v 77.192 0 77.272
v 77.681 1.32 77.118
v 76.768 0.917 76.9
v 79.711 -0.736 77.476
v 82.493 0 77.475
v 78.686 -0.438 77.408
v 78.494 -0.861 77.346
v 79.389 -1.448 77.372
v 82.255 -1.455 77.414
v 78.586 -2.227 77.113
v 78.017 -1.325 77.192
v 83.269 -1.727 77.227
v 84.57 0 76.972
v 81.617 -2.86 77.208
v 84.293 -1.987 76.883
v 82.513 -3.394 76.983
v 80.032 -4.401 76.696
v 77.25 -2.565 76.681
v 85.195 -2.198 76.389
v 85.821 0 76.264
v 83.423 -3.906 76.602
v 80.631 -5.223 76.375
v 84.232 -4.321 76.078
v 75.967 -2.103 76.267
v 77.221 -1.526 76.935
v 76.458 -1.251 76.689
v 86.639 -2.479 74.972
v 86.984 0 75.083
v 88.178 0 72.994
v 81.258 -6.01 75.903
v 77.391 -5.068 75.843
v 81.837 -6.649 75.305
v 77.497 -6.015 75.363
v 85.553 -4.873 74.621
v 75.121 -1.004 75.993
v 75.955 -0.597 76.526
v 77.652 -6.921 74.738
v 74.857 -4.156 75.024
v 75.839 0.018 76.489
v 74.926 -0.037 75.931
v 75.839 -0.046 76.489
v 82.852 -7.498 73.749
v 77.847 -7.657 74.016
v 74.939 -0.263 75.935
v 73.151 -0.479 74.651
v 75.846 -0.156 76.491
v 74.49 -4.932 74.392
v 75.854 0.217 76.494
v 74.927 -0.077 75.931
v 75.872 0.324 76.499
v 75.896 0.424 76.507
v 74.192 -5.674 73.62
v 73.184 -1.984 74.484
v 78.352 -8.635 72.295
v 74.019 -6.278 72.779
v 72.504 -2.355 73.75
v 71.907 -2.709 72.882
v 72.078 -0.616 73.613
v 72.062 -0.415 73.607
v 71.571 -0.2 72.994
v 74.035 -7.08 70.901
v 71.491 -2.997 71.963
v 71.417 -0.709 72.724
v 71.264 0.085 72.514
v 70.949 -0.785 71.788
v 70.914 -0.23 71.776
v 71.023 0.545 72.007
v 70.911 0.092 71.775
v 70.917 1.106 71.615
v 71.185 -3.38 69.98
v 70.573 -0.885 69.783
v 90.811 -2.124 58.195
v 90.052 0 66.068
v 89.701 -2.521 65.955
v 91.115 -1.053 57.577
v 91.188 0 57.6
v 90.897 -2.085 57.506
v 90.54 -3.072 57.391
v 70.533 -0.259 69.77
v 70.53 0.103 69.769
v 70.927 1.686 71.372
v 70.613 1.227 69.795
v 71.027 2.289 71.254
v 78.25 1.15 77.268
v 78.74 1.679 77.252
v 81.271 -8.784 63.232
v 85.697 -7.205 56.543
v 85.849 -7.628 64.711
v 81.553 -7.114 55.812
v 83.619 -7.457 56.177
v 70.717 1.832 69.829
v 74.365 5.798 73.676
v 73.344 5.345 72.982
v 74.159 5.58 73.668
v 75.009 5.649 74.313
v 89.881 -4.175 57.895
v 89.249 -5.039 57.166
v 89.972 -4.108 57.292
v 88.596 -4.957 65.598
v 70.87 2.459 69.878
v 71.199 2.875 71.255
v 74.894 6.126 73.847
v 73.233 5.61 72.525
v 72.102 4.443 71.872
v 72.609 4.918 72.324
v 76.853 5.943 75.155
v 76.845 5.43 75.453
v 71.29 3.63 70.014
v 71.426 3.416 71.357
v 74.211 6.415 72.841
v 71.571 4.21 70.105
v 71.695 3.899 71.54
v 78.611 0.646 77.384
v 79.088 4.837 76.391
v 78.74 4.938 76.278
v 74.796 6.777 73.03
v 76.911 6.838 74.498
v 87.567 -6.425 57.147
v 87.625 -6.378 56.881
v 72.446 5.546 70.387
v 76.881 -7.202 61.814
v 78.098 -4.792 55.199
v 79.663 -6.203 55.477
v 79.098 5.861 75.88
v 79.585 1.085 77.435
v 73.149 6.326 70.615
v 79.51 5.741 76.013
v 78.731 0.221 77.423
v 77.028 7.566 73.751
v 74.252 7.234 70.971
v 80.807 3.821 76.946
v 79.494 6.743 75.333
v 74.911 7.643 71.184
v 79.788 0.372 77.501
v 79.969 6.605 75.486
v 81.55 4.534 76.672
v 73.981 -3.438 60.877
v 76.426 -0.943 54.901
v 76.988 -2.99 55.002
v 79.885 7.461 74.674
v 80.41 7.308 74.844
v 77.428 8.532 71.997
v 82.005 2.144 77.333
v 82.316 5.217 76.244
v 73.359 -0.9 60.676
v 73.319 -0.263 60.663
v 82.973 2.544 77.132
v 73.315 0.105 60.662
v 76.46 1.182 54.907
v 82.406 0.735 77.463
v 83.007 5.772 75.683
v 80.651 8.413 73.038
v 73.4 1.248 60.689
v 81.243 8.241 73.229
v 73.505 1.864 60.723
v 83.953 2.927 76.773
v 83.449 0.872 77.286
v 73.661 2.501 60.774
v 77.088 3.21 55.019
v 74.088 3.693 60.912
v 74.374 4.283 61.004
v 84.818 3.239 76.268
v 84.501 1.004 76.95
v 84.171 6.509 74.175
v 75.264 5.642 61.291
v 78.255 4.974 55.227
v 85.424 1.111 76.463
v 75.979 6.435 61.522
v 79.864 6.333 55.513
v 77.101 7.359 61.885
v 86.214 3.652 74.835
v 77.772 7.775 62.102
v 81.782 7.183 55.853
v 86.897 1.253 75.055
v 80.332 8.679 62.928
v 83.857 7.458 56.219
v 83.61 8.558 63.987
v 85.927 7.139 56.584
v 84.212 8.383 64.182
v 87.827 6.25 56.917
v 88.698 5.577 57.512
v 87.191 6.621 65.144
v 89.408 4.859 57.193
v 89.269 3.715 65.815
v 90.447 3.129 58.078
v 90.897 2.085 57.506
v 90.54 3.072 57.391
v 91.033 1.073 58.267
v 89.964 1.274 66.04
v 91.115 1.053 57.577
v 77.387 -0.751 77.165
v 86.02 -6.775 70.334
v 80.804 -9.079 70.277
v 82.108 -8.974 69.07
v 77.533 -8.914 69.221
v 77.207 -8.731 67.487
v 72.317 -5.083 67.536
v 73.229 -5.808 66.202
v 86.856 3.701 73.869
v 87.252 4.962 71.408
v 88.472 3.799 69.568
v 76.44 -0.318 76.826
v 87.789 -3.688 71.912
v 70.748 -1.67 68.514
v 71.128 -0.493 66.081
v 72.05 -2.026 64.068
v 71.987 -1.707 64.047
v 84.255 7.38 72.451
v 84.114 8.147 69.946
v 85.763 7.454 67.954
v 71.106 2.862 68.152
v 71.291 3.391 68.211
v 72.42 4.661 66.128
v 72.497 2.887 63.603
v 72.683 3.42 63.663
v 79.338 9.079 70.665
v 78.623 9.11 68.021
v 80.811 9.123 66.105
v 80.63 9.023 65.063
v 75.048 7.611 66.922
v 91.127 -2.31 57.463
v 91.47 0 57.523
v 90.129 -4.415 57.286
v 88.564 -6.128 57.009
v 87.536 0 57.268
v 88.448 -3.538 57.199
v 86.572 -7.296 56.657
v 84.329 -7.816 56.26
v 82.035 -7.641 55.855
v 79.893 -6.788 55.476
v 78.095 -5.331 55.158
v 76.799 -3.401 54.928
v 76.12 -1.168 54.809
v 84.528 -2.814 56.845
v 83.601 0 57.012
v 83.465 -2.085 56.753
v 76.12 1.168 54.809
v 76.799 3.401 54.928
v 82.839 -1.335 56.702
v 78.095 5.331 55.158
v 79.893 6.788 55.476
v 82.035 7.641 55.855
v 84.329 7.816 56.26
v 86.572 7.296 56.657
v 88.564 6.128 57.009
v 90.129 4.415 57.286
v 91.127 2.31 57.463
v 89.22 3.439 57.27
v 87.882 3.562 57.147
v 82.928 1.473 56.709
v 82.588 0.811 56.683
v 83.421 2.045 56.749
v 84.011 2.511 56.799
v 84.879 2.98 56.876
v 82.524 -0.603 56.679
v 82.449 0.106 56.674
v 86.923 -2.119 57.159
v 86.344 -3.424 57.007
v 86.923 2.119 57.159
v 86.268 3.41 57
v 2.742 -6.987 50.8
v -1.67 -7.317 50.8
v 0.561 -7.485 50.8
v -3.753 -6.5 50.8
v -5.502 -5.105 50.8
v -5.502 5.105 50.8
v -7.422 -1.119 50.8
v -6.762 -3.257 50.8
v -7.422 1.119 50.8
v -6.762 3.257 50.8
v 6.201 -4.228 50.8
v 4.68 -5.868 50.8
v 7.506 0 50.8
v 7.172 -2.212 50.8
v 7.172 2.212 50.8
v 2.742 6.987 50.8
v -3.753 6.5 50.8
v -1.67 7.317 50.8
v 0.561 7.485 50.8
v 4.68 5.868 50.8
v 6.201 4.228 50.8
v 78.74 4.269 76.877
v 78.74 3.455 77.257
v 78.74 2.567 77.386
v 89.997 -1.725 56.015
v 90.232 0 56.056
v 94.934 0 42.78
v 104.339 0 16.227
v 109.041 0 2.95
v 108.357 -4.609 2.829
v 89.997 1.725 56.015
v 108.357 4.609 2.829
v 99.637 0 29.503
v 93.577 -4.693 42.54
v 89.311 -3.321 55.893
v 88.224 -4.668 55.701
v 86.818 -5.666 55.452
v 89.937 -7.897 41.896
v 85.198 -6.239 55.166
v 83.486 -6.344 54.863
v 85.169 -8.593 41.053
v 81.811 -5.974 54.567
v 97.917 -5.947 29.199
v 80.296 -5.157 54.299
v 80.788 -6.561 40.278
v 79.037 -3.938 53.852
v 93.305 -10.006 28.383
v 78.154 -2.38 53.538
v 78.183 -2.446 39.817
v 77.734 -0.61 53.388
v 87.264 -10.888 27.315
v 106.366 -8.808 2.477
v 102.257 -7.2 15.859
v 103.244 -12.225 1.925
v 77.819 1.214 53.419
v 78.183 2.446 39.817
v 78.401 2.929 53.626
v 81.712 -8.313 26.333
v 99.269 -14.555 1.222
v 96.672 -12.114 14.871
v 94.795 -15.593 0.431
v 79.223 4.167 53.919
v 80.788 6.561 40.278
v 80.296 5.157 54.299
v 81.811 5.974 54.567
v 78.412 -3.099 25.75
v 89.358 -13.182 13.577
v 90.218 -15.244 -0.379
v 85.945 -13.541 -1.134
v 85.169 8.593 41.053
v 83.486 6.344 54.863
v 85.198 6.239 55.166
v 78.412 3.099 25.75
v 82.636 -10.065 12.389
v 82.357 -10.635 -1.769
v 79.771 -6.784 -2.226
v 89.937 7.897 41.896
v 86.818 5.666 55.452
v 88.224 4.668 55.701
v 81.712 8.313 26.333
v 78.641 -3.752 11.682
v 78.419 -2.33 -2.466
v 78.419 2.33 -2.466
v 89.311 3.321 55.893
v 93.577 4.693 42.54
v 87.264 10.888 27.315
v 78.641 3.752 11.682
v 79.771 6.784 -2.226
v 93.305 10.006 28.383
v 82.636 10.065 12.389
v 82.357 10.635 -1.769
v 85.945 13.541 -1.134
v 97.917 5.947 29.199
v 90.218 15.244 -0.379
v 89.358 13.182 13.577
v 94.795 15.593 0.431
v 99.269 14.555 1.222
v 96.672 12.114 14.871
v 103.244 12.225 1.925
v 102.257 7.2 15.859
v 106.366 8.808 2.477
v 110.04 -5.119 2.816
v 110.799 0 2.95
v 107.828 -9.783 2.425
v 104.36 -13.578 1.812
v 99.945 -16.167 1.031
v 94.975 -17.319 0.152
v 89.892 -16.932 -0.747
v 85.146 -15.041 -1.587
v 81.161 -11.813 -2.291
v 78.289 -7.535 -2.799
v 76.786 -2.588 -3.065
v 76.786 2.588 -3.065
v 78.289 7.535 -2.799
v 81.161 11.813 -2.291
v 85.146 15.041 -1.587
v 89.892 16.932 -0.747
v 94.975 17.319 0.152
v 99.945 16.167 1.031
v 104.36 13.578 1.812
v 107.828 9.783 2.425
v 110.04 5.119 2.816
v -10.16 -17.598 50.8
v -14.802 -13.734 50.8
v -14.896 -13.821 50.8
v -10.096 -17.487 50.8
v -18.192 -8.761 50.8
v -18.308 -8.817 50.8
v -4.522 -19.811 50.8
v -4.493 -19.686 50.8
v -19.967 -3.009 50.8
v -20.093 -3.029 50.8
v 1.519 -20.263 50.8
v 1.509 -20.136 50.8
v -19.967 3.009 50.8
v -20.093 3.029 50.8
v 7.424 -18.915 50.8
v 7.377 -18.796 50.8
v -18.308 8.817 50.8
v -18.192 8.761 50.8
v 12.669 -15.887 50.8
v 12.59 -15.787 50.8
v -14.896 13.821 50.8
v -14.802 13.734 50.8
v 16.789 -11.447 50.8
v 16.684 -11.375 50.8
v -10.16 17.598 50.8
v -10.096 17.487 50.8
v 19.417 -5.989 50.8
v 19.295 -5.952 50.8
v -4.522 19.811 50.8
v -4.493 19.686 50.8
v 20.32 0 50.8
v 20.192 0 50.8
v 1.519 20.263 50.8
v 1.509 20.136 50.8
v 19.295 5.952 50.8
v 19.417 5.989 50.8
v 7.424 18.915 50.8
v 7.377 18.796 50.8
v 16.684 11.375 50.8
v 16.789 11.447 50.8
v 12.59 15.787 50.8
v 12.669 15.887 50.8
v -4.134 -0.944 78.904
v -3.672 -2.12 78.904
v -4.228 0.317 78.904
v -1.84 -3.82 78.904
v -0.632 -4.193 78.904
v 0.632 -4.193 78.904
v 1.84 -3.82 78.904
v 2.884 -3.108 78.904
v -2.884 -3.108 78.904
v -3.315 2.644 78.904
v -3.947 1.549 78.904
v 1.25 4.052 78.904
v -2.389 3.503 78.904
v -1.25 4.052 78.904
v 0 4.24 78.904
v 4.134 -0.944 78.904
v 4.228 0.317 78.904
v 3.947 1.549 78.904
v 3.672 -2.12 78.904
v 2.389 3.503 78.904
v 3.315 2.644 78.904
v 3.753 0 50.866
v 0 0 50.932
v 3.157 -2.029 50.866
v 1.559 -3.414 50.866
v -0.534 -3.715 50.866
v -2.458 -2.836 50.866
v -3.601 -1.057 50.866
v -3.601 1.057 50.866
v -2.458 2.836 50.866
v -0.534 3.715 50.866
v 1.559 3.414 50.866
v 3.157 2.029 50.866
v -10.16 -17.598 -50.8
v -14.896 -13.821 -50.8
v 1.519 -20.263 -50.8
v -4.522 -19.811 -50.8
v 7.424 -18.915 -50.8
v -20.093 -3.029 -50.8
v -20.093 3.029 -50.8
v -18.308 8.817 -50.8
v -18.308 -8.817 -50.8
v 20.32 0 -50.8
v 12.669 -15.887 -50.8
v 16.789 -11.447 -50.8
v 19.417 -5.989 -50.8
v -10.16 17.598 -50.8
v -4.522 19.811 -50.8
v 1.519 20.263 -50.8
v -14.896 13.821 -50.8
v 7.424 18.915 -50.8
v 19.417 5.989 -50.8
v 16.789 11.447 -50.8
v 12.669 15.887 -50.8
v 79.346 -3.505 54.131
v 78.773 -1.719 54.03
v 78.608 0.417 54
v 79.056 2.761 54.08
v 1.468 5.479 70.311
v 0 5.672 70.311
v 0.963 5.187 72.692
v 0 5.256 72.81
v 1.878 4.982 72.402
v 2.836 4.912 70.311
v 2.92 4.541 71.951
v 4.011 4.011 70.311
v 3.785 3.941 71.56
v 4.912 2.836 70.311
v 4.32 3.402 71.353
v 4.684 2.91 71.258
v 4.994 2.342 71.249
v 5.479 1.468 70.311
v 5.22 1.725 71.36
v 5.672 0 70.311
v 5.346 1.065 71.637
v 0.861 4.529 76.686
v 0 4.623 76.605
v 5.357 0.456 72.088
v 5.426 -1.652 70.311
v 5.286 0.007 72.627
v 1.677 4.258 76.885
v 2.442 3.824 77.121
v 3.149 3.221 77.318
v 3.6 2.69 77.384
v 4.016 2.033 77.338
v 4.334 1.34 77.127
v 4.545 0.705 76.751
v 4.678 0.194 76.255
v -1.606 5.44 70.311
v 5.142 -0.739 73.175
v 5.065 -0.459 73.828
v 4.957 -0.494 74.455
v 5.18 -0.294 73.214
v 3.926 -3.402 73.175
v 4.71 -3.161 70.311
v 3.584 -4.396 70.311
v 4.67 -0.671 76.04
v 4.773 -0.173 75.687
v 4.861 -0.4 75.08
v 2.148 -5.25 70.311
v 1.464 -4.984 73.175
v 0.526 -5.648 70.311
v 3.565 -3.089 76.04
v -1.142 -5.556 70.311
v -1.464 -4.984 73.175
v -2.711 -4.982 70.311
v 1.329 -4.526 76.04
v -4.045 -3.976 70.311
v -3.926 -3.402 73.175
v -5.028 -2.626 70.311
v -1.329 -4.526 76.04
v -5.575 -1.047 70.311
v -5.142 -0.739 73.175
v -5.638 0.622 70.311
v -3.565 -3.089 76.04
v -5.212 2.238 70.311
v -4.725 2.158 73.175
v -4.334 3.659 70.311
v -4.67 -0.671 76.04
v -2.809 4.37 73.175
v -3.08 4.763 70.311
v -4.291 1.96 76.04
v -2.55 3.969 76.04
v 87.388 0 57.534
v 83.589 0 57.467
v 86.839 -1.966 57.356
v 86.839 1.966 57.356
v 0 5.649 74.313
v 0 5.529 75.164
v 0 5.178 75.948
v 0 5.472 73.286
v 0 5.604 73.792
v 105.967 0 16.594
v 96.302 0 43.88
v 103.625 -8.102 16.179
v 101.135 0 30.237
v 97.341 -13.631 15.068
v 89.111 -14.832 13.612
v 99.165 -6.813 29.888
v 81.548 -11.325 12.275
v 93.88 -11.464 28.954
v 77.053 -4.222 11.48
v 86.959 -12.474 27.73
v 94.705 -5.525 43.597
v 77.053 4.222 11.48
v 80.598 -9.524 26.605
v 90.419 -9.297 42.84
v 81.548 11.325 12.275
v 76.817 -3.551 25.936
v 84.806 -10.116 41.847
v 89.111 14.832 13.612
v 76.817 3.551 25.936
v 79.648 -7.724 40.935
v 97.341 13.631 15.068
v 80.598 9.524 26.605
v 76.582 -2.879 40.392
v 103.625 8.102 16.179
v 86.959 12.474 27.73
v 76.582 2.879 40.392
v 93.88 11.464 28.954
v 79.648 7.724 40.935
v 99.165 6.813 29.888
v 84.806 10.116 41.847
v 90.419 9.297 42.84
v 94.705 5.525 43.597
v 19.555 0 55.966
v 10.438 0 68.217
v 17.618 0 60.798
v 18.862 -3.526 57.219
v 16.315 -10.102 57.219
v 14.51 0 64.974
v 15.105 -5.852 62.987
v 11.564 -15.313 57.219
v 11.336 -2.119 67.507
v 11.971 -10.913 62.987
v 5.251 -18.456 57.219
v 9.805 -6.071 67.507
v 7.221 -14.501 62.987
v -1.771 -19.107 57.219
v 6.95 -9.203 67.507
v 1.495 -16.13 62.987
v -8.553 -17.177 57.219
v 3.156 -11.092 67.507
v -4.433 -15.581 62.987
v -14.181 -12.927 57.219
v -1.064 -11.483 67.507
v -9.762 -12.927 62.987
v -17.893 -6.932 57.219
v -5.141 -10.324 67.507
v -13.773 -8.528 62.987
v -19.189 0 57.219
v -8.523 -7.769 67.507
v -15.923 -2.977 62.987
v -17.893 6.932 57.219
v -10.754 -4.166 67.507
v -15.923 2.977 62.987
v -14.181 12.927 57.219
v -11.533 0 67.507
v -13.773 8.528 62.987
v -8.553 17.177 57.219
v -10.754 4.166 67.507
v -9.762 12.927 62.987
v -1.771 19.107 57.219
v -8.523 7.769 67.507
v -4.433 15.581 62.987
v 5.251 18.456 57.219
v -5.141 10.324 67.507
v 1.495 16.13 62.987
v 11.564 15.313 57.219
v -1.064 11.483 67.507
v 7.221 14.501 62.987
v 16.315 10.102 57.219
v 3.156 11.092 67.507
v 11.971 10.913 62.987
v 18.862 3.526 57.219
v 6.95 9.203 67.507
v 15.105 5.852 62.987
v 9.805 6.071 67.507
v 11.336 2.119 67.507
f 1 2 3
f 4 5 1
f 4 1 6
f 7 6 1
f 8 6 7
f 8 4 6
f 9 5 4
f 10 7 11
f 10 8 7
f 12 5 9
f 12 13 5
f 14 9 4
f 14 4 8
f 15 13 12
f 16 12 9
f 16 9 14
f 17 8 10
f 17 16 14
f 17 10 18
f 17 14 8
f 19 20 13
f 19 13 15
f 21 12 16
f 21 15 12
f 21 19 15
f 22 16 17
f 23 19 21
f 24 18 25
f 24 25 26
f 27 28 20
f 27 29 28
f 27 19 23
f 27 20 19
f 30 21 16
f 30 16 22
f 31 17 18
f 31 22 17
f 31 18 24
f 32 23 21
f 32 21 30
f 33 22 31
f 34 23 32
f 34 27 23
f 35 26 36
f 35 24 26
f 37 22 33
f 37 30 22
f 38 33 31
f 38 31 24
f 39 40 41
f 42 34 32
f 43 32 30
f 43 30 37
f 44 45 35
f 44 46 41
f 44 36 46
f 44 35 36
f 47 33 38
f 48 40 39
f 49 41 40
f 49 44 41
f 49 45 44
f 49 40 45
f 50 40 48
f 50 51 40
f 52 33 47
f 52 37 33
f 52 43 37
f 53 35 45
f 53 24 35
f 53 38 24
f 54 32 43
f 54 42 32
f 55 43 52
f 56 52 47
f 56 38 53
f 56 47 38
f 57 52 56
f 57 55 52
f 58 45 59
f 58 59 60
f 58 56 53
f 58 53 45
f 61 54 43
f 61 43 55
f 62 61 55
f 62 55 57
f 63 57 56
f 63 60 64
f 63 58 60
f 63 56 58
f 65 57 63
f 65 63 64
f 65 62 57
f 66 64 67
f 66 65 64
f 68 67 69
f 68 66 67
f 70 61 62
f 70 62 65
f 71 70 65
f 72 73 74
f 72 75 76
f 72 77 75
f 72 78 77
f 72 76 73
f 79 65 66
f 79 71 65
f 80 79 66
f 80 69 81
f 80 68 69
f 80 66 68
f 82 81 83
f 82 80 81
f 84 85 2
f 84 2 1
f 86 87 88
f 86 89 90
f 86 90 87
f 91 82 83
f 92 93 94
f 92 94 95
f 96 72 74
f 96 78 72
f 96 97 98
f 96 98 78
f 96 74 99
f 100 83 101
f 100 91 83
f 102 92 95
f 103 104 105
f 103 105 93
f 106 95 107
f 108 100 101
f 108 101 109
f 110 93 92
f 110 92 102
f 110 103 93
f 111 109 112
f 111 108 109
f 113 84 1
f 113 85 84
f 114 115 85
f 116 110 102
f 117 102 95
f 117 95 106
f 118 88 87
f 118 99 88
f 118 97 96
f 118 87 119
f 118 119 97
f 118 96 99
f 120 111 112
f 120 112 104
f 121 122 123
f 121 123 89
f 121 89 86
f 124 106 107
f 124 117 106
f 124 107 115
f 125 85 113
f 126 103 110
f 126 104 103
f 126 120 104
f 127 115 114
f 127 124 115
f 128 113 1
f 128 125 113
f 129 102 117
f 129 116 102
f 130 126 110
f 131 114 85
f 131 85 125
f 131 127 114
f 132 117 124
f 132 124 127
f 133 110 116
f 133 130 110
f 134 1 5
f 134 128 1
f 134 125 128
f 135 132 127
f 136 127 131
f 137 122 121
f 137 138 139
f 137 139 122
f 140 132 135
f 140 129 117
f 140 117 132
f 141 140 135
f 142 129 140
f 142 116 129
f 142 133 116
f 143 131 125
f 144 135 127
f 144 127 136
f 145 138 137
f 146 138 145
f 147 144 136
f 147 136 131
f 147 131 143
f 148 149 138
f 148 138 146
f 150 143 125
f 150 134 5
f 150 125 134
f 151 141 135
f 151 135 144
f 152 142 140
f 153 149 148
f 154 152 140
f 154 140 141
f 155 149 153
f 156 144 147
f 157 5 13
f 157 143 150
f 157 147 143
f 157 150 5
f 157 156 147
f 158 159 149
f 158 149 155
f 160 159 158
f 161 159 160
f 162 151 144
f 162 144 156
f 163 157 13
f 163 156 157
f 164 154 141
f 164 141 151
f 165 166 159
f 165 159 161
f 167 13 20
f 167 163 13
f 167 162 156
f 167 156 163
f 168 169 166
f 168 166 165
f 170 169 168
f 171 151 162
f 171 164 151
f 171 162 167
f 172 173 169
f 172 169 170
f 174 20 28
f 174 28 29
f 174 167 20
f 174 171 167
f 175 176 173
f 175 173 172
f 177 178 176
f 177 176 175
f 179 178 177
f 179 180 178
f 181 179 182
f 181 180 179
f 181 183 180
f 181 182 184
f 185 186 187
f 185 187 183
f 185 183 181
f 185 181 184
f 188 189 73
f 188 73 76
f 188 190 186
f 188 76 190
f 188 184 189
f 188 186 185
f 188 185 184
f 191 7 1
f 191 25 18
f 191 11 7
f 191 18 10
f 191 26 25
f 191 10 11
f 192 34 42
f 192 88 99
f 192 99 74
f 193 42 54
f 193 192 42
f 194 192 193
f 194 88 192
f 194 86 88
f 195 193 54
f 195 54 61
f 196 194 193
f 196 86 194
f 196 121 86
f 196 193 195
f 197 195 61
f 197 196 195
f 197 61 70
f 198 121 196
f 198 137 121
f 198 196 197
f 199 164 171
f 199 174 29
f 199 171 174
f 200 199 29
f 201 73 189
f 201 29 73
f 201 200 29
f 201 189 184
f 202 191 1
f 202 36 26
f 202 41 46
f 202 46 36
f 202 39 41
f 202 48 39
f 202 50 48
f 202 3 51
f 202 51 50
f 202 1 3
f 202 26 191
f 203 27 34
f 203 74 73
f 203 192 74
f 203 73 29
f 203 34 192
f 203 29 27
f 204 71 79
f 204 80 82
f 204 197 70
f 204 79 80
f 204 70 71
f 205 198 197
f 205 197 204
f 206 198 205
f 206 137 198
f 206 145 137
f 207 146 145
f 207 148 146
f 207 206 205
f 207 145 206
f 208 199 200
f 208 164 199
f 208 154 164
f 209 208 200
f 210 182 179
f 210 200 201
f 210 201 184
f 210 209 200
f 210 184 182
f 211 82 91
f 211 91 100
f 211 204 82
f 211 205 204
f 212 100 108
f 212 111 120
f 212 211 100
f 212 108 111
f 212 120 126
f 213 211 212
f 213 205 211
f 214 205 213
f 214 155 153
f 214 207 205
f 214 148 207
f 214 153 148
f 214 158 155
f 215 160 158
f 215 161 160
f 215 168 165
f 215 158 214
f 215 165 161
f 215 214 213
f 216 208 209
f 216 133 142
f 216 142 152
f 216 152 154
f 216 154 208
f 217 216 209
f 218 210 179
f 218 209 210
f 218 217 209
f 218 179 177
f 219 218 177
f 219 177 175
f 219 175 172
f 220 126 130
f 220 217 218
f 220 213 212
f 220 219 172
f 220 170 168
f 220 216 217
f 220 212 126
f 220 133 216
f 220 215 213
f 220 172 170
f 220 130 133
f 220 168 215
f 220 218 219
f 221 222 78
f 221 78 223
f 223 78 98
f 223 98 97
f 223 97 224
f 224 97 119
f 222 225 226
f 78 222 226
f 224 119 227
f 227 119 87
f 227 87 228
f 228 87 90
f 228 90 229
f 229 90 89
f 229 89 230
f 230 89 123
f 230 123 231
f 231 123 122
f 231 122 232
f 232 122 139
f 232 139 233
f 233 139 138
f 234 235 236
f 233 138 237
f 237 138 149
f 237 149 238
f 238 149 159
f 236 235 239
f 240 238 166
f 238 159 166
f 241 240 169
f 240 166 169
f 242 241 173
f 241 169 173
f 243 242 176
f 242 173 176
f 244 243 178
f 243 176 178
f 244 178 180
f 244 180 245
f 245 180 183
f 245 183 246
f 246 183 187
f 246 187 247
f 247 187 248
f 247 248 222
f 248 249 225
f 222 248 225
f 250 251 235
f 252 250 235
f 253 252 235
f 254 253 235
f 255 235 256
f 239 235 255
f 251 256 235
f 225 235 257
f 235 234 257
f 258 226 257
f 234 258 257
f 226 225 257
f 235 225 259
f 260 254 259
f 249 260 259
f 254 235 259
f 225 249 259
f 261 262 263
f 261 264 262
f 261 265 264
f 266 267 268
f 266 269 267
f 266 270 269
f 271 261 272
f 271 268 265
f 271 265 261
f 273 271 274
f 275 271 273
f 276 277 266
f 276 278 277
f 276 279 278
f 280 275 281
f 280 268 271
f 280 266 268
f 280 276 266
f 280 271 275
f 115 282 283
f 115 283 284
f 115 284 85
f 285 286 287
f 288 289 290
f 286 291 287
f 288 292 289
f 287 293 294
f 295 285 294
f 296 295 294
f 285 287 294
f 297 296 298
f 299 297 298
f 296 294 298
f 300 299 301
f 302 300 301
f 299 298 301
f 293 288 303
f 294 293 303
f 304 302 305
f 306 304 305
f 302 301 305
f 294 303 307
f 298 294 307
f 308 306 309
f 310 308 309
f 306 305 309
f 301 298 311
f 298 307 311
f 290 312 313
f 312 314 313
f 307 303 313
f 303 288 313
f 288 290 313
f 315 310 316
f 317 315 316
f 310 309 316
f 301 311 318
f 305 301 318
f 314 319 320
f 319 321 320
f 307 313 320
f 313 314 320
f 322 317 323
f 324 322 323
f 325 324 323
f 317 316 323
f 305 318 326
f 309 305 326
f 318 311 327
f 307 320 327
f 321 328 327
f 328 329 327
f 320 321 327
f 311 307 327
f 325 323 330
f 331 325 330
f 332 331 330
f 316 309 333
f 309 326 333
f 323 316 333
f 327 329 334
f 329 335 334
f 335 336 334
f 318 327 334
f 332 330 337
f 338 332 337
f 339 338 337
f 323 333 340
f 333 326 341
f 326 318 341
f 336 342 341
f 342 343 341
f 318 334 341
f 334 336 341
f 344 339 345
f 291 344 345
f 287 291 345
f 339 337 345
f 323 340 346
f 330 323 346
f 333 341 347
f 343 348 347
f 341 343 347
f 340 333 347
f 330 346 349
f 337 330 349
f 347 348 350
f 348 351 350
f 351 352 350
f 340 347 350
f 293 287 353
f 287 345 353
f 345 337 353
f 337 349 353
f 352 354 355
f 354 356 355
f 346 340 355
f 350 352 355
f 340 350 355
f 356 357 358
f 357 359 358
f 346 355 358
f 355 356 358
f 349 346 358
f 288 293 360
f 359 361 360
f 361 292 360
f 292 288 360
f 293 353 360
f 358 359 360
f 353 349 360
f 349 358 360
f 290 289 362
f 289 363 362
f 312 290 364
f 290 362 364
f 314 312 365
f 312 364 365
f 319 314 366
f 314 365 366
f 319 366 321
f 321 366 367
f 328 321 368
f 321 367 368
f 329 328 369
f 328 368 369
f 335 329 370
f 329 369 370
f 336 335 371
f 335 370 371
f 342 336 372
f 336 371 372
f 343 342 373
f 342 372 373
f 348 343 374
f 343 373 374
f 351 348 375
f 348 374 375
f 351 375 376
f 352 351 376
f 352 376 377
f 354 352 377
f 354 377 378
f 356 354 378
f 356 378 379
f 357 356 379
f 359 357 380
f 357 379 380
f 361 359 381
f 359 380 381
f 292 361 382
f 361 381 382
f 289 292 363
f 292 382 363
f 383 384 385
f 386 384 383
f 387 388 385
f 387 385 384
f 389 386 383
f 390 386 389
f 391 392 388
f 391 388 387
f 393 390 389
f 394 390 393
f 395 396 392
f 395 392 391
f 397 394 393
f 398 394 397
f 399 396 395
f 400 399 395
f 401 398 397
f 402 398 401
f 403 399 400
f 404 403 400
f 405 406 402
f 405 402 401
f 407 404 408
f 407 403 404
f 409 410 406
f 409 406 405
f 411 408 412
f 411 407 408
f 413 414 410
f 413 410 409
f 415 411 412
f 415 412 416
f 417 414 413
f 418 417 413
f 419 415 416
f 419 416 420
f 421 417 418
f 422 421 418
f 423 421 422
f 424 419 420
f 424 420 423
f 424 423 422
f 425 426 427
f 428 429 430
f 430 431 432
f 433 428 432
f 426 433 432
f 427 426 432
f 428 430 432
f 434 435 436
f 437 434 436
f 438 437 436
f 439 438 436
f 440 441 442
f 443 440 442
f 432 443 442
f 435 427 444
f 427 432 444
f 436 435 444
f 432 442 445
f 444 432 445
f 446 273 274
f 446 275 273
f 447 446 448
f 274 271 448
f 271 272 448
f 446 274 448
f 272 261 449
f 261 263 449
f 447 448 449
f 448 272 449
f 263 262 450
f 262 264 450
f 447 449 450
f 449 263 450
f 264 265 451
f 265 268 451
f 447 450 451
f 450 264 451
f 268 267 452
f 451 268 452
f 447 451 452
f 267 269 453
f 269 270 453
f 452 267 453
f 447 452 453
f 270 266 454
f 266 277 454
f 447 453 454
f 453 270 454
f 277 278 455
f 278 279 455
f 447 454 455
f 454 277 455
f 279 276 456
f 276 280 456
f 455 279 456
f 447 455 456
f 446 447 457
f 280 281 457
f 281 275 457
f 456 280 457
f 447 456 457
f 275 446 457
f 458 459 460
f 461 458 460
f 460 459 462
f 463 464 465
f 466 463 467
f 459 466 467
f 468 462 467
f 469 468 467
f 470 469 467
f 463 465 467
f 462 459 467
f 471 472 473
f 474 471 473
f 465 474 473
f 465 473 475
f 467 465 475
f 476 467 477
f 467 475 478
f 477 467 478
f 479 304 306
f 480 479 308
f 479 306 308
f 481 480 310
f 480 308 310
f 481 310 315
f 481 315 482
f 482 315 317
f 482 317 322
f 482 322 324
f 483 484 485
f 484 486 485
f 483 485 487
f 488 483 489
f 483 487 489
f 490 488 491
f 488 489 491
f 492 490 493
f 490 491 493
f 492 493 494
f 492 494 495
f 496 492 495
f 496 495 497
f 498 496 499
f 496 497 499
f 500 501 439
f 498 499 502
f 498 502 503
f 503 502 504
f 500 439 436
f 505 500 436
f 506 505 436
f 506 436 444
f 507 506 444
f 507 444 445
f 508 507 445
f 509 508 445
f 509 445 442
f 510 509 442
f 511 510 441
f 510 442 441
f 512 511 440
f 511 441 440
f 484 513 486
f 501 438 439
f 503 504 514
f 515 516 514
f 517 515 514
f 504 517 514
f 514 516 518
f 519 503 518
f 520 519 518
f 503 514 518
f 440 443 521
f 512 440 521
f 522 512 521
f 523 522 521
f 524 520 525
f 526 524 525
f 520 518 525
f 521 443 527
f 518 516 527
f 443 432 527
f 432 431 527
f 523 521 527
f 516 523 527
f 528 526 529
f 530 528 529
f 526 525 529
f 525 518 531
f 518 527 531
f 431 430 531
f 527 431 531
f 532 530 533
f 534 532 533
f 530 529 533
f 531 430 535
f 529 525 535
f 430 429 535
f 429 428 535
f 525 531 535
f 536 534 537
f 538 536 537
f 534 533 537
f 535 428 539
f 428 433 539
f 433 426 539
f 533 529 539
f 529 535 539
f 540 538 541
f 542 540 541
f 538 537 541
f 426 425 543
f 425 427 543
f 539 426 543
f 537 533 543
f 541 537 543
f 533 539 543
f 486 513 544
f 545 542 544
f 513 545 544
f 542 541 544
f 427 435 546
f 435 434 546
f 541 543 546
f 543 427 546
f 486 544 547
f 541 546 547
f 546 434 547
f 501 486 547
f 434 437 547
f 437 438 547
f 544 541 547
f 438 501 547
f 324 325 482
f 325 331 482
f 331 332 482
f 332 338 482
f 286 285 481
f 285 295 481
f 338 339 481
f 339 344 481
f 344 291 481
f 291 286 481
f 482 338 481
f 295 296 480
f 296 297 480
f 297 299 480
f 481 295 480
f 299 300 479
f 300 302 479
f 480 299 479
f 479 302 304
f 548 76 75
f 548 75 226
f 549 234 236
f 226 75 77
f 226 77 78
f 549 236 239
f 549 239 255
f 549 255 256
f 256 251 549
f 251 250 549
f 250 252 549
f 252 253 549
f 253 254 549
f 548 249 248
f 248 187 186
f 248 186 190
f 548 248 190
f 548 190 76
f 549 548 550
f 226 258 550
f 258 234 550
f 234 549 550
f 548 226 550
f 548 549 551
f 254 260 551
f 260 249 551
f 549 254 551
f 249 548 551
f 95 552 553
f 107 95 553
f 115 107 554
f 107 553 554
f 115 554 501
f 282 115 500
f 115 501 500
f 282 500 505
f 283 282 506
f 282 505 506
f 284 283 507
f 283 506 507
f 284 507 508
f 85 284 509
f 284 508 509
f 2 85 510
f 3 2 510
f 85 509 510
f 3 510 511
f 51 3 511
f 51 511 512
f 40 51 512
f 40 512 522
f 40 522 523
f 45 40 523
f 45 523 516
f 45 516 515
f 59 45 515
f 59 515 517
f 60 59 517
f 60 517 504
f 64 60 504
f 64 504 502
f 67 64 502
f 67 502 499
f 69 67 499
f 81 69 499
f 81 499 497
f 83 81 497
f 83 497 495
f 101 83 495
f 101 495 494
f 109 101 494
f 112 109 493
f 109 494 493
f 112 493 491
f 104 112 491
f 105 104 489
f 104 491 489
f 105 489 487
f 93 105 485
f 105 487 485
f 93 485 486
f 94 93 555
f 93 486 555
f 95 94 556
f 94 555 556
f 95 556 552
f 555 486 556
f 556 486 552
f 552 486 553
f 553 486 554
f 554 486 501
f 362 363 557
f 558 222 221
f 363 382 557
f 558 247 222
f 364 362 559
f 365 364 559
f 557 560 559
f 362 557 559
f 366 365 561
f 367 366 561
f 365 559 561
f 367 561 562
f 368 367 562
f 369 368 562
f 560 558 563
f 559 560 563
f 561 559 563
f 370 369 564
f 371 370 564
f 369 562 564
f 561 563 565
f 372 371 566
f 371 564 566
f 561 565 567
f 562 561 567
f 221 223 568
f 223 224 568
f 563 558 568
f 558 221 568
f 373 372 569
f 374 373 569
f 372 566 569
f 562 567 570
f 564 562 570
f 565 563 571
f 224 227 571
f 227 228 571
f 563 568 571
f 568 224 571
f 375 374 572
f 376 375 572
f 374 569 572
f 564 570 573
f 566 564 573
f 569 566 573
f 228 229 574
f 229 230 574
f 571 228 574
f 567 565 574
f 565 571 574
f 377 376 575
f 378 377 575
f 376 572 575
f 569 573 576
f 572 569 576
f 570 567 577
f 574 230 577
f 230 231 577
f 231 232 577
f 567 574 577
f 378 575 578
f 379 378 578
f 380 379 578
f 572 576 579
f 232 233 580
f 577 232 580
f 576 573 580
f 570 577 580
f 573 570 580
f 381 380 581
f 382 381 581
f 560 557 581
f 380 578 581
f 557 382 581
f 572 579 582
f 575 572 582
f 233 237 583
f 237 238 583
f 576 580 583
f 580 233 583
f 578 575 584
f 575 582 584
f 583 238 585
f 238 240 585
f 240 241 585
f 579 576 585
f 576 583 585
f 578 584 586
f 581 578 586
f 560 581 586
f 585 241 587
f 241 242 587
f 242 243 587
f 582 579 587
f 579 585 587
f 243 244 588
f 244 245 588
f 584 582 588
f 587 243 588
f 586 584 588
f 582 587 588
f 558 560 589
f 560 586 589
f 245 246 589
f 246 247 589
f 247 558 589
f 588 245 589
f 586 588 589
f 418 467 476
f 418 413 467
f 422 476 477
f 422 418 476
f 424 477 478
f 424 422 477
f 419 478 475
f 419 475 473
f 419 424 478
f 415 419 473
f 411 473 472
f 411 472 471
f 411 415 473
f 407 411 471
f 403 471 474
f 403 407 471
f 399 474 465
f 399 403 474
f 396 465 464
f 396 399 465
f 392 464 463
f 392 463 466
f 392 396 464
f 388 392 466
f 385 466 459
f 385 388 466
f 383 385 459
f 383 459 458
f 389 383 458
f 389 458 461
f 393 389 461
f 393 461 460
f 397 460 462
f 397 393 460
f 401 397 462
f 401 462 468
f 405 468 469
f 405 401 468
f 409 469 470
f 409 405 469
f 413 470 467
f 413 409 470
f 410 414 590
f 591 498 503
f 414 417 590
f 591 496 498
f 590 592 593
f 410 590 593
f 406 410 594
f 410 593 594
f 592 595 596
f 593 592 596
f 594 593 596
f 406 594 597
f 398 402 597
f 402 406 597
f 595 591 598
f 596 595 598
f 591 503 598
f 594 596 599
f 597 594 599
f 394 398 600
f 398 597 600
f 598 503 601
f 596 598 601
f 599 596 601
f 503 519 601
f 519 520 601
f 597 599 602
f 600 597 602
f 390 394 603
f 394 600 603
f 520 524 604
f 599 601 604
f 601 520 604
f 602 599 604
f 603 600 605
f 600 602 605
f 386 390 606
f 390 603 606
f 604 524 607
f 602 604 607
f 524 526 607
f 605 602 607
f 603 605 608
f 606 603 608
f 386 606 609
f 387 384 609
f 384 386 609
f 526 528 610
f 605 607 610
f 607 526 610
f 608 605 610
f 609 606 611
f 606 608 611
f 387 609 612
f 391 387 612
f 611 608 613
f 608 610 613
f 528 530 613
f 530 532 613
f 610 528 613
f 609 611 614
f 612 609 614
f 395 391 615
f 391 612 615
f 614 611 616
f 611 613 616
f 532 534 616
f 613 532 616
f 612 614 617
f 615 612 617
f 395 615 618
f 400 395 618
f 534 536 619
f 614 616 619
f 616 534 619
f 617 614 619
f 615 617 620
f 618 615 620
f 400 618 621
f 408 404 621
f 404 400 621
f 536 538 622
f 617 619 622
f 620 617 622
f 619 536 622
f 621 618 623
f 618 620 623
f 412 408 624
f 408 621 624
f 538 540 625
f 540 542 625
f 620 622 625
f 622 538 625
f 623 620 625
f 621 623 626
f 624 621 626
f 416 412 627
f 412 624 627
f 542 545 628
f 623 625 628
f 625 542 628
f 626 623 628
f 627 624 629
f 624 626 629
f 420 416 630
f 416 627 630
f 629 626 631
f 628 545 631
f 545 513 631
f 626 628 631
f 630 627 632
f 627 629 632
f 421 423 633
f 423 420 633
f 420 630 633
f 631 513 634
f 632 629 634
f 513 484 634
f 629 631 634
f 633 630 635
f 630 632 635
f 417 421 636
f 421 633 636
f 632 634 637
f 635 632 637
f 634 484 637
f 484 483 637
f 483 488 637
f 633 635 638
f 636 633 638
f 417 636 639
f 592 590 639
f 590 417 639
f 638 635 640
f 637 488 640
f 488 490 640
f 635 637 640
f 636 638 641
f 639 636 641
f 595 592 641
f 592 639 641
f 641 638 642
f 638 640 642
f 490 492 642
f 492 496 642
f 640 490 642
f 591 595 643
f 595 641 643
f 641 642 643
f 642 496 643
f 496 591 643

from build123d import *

# Parameters (mm, degrees)
F0_R     = 20.32
F1_DEPTH = 50.8
F7_R     = 3.0729490934
F8_DEPTH = 78.74


with BuildPart() as f1:
    # F0 (on Top) → F1 (new body, symmetric)
    with BuildSketch(Plane.XY):
        Circle(F0_R)
    extrude(amount=F1_DEPTH, both=True)

    # F2 (on Front) → F3 (revolve)
    with BuildSketch(Plane.XZ):
        with BuildLine():
            Line((0, 50.9317442775), (20.189454779, 50.5773611367))
            ThreePointArc((20.189454779, 50.5773611367), (14.4030478755, 65.0841957818), (0, 71.1243090399))
            Line((0, 71.1243090399), (0, 50.9317442775))
        make_face()
    revolve(axis=Axis((0, 0, 61.0280266587), (0, 0, -1)))

    # F5 (on Right) → F6 (revolve)
    with BuildSketch(Plane.YZ):
        Polygon((0, 62.3119361699), (1.6591945896, 62.3119361699), (7.0054852404, 62.3119361699), (4.2401598766, 78.903876245), (0, 78.903876245), align=None)
    revolve(axis=Axis((0, 0, 70.6079062074), (0, 0, -1)))

    # F7 (on Right) → F8 (join)
    with BuildSketch(Plane.YZ):
        with Locations((2.5758331176, 74.3131265044)):
            Circle(F7_R)
    extrude(amount=F8_DEPTH)

    # F9 (on Front) → F10 (revolve)
    with BuildSketch(Plane.XZ):
        with BuildLine():
            add(Edge.make_bspline(
                [(77.1916285157, 77.2717222571), (80.5414482084, 77.6263895759), (88.7637679854, 78.496940345), (90.2856769773, 65.3756755472), (91.1875516176, 57.6000884175)],
                knots=[0, 0, 0, 0, 0.4074056694, 1, 1, 1, 1], degree=3))
            Line((77.1916285157, 77.2717222571), (79.1982337832, 74.6180936694))
            add(Edge.make_bspline(
                [(79.1982337832, 74.6180936694), (80.9350673917, 74.6645930701), (85.9177561117, 74.7979921694), (84.5073837742, 64.3036691827), (83.588629961, 57.4673898518)],
                knots=[0, 0, 0, 0, 0.3485735726, 1, 1, 1, 1], degree=3))
            Line((83.588629961, 57.4673898518), (91.1875516176, 57.6000884175))
        make_face()
        with BuildLine():
            Line((79.1982337832, 74.6180936694), (77.1916285157, 77.2717222571))
            Line((77.1916285157, 77.2717222571), (83.588629961, 57.4673898518))
            add(Edge.make_bspline(
                [(79.1982337832, 74.6180936694), (80.9350673917, 74.6645930701), (85.9177561117, 74.7979921694), (84.5073837742, 64.3036691827), (83.588629961, 57.4673898518)],
                knots=[0, 0, 0, 0, 0.3485735726, 1, 1, 1, 1], degree=3))
        make_face()
    revolve(axis=Axis((80.3901292384, 0, 67.3695560545), (0.3073729937, 0, -0.9515891144)))

    # F11 (on Front) → F12 (revolve)
    with BuildSketch(Plane.XZ):
        Polygon((91.4701148868, 57.5232356787), (83.6011469364, 57.0121742785), (83.9662040441, 54.9480340358), (90.231738364, 56.0561359902), (109.0413108468, 2.9503183905), (110.7993200421, 2.9503183905), align=None)
    revolve(axis=Axis((88.3817486465, 0, 29.9812463345), (0.1741540854, 0, -0.9847184138)))


solid = f1.part
